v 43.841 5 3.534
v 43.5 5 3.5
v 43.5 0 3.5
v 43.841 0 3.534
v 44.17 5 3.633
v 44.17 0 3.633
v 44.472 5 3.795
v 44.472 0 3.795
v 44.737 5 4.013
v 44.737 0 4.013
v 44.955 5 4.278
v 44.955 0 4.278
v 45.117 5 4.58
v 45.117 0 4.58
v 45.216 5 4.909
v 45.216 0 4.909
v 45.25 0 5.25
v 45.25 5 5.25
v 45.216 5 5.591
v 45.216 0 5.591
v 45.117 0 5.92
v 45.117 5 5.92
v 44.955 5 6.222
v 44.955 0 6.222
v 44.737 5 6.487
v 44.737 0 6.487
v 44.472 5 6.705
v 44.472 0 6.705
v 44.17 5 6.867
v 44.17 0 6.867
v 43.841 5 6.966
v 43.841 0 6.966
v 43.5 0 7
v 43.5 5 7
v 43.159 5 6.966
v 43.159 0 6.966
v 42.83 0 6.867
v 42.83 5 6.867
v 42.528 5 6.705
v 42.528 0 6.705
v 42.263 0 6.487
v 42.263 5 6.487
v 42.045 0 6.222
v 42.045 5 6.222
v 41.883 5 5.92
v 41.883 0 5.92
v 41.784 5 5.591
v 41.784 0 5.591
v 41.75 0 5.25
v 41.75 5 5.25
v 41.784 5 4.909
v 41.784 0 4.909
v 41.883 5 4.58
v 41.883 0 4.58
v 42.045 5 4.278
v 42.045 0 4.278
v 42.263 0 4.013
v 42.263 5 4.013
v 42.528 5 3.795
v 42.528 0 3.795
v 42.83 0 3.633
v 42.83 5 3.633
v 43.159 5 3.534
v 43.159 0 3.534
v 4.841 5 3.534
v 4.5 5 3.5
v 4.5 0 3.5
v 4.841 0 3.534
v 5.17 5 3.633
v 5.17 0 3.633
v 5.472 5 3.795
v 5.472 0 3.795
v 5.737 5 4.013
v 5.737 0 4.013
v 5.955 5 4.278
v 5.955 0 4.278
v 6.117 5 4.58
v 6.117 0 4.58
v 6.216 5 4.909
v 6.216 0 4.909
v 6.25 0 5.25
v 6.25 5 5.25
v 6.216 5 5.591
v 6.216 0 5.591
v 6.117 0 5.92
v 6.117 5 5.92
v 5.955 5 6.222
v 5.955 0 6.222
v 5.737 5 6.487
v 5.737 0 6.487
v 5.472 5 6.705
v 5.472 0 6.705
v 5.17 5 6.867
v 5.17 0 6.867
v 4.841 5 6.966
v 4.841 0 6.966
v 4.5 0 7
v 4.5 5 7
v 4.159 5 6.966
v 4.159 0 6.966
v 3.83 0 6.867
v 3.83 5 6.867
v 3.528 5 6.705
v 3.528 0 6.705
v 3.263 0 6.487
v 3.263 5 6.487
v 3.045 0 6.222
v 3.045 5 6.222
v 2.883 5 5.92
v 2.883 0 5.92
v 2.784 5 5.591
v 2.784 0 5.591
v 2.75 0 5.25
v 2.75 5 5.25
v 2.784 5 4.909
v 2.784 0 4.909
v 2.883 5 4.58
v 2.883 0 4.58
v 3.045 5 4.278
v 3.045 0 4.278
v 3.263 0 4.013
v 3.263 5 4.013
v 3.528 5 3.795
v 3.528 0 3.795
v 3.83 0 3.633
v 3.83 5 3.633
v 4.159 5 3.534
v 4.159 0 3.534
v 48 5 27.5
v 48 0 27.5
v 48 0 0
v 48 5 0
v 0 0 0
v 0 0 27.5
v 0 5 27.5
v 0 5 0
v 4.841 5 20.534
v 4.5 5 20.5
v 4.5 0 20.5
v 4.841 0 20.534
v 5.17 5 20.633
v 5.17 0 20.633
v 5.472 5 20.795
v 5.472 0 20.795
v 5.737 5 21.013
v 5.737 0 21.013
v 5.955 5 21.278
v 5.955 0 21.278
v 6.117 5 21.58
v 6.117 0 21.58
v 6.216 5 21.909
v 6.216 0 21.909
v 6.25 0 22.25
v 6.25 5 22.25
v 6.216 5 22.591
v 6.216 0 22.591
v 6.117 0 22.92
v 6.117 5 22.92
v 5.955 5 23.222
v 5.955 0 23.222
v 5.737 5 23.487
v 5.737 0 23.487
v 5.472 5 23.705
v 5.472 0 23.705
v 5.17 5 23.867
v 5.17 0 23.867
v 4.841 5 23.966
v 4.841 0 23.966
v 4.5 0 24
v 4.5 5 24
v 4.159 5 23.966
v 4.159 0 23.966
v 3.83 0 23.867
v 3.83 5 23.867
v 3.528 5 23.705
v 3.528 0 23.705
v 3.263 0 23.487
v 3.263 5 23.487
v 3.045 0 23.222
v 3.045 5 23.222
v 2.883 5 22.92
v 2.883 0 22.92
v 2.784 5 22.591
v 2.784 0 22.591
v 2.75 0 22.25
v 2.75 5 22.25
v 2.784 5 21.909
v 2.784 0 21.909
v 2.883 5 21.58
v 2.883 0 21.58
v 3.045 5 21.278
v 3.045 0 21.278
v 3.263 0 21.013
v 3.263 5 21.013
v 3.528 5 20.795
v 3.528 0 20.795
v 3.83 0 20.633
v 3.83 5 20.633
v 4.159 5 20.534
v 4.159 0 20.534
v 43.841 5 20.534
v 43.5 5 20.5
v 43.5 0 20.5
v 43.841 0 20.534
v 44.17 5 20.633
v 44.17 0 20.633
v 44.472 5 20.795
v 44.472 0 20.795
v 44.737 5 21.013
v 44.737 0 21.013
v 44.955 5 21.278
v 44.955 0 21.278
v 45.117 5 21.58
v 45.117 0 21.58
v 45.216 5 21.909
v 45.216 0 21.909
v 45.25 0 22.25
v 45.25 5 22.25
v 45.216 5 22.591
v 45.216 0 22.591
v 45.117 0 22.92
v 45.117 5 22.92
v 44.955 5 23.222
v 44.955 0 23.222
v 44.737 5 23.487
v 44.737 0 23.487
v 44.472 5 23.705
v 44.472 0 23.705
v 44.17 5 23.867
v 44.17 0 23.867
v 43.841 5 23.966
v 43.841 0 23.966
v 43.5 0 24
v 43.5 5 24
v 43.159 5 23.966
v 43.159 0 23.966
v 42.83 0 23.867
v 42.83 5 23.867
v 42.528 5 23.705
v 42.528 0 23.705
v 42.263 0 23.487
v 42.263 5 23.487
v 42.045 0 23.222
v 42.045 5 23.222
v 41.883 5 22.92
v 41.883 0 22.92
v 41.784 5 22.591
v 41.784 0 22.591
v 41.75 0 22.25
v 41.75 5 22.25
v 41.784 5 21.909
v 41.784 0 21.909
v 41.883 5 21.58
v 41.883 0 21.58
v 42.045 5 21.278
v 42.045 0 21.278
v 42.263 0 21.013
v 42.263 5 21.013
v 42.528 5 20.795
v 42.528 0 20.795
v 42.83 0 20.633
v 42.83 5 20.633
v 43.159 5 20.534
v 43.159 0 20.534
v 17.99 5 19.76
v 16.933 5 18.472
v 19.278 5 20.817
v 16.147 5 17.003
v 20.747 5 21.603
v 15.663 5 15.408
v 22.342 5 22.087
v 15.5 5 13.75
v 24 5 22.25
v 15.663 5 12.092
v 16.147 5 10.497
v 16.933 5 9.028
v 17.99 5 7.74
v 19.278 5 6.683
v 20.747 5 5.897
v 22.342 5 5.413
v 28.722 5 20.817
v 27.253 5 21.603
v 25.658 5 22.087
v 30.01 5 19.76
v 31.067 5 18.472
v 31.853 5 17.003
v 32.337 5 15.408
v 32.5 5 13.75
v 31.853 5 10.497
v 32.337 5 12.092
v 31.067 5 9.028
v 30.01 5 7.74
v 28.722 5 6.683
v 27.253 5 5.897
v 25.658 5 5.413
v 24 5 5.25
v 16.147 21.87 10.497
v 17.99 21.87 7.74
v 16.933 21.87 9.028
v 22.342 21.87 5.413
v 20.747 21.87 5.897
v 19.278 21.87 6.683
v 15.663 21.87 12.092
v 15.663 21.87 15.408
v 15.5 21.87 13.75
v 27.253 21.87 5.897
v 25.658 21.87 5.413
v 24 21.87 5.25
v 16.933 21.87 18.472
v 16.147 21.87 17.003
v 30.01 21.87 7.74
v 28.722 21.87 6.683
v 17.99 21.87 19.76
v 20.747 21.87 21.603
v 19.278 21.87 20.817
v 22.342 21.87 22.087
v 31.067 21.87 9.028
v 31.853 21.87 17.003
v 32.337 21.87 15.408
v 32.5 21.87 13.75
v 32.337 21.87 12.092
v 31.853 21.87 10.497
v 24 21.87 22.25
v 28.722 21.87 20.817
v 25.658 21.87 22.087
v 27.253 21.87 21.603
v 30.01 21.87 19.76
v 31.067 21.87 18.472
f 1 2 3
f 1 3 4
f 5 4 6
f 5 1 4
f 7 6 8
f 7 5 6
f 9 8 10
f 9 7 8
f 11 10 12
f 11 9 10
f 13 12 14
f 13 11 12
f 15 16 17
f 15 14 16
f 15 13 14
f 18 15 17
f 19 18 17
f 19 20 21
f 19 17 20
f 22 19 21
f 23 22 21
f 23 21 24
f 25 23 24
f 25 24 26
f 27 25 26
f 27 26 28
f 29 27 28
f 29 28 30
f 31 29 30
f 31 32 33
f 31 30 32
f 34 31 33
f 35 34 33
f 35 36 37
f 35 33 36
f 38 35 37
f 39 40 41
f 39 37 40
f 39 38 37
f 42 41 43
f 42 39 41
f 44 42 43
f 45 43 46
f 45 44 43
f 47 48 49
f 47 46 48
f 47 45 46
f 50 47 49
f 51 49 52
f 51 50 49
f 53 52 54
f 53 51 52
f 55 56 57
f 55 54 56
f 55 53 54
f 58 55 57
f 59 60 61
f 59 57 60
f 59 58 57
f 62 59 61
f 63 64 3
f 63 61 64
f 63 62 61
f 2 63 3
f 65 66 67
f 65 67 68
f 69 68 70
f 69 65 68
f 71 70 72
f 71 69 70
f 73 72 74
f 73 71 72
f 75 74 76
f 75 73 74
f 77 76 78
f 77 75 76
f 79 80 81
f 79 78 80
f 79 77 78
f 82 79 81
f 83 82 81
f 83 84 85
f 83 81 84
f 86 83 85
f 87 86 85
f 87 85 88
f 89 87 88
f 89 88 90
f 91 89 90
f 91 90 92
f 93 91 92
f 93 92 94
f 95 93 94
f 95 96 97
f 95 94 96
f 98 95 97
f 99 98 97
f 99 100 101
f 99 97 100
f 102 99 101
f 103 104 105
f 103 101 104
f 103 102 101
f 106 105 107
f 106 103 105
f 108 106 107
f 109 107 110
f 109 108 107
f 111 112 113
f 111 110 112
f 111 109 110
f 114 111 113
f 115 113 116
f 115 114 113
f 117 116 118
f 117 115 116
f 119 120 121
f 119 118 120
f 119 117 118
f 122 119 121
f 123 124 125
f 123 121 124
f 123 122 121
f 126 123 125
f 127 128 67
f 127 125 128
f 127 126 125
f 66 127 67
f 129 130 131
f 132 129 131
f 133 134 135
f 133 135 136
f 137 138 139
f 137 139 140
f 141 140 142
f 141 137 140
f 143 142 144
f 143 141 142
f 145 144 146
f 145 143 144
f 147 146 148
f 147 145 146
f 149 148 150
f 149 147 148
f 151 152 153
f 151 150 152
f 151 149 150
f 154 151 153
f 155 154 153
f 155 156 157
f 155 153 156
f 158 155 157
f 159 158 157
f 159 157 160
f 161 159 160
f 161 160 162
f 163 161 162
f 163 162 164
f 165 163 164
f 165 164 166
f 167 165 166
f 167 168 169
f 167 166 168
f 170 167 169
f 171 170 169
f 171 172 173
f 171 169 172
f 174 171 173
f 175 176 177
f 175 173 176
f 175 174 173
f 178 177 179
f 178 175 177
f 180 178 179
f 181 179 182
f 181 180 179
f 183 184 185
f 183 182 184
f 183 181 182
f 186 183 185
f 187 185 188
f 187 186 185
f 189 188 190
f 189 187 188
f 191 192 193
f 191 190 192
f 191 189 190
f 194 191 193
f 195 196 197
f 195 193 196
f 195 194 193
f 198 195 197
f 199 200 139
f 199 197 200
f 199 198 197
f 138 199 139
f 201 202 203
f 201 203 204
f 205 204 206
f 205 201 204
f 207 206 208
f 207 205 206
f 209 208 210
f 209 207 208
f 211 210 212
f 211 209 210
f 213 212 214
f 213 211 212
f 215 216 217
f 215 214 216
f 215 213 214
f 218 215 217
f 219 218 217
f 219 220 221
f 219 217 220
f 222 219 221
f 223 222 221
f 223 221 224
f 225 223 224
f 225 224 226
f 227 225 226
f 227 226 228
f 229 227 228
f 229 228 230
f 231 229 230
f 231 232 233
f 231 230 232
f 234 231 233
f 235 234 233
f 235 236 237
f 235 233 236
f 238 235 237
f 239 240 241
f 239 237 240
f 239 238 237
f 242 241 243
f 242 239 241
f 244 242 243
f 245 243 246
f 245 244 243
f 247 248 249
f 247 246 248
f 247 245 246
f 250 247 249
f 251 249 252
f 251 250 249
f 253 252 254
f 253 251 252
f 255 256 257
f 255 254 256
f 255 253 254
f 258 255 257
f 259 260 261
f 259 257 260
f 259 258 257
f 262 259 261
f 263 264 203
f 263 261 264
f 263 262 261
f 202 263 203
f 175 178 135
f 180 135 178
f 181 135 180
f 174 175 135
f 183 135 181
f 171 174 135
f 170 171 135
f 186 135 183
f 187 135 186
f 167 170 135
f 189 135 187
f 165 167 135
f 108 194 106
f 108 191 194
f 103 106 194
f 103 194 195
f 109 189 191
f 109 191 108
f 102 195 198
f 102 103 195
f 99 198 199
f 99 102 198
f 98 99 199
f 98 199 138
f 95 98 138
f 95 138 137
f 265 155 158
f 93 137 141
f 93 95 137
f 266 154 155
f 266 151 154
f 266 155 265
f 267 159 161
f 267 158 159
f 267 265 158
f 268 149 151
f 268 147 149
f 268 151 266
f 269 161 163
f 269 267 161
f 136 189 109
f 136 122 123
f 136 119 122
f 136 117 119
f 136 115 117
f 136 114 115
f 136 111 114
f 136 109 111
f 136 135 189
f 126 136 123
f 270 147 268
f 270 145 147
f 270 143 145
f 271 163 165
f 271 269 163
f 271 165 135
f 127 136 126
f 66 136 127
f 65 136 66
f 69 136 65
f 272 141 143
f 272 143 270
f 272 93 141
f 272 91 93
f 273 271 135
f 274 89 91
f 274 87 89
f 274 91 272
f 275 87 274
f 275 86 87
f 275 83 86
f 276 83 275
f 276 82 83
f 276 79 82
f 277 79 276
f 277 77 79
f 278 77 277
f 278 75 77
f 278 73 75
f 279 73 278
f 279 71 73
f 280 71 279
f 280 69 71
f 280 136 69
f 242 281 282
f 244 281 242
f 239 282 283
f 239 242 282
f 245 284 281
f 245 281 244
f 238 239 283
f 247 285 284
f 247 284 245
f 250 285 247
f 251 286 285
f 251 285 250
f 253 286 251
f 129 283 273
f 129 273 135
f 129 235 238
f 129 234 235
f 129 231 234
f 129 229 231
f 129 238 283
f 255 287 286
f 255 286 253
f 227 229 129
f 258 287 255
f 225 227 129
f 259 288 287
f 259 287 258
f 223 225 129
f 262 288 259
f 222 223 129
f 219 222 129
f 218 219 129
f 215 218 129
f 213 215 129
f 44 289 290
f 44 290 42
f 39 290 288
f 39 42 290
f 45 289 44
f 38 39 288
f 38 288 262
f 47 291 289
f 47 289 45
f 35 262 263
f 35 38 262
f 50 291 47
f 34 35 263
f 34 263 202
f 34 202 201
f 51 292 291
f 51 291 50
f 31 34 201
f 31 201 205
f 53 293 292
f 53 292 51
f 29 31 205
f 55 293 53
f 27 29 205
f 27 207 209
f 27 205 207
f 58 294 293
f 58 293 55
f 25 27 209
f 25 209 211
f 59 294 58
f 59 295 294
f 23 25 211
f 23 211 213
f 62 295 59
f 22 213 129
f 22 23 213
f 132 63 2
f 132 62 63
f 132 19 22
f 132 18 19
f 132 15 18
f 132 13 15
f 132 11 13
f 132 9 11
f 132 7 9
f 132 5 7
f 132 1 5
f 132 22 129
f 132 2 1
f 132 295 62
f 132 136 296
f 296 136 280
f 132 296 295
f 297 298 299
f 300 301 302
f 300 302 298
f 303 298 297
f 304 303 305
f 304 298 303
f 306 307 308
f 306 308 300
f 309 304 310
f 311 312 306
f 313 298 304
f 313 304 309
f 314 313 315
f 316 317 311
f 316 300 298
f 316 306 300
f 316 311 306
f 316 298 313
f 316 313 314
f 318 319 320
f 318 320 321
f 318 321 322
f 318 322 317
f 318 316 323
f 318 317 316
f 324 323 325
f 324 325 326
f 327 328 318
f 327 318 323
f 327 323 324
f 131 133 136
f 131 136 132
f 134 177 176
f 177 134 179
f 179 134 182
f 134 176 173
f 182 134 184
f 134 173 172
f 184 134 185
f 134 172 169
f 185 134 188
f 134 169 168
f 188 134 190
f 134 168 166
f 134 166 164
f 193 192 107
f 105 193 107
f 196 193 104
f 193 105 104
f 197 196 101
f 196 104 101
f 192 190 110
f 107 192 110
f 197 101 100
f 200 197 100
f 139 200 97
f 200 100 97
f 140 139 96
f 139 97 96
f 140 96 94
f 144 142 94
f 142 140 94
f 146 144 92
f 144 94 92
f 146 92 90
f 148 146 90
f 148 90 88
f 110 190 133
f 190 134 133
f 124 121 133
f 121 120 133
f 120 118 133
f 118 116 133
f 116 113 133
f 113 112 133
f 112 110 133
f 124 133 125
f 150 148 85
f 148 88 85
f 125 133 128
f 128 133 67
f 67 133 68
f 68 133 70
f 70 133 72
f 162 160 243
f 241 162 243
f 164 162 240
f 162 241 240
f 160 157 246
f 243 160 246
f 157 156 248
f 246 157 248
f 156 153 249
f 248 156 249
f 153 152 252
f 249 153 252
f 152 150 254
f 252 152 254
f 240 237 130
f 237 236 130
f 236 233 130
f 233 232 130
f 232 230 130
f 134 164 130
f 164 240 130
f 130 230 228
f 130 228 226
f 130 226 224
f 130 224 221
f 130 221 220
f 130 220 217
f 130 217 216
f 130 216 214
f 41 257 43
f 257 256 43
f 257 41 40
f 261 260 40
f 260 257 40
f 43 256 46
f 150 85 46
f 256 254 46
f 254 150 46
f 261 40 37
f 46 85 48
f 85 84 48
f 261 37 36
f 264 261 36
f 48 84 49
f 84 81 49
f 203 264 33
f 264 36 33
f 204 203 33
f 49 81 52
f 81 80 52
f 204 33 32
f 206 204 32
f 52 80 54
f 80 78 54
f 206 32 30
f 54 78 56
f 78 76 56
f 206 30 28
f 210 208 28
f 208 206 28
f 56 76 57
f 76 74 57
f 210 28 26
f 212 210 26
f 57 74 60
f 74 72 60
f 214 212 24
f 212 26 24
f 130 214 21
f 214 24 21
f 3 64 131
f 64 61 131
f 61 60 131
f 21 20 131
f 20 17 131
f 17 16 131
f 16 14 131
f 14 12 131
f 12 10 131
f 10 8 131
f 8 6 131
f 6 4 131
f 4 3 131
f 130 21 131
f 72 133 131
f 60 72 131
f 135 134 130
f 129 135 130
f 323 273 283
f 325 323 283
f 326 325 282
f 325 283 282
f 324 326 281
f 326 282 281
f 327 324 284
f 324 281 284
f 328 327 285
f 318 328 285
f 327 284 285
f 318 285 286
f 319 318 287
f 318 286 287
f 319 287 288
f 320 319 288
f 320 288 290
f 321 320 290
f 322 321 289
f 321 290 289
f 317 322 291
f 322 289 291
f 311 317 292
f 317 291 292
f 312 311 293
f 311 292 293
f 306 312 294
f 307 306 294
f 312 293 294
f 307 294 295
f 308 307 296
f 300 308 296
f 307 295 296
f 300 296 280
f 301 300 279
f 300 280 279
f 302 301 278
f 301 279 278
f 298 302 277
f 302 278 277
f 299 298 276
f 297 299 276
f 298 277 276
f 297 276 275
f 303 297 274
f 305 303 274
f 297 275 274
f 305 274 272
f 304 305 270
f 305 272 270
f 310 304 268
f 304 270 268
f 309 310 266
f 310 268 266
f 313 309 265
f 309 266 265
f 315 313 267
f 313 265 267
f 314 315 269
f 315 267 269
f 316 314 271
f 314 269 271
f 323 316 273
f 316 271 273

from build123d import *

# Parameters (mm, degrees)
SKETCH_1_W               = 48
SKETCH_1_H               = 27.5
EXTRUDE_1_DEPTH          = 5
SKETCH_2_R               = 8.5
EXTRUDE_2_DEPTH          = 16.87
CUT_EXTRUDE_1_DEPTH      = 60.485686514
CUT_EXTRUDE_1_DEPTH_BACK = 60.485686514
SKETCH_3_R               = 1.75


with BuildPart() as part:
    # 草图1 → 凸台-拉伸1 (new body)
    with BuildSketch(Plane(origin=(0, 0, 0), x_dir=(1, 0, 0), z_dir=(0, 1, 0))):
        with Locations((24, -13.75)):
            Rectangle(SKETCH_1_W, SKETCH_1_H)
    extrude(amount=EXTRUDE_1_DEPTH)

    # 草图2 → 凸台-拉伸2 (add)
    with BuildSketch(Plane(origin=(0, 5, 0), x_dir=(1, 0, 0), z_dir=(0, 1, 0))):
        with Locations(Location((24, -13.75, 0), (0, 0, 270))):
            Circle(SKETCH_2_R)
    extrude(amount=EXTRUDE_2_DEPTH)

    # 草图3 → 切除-拉伸1 (cut, two sides: drawn at the far end of the back side and taken through both)
    with BuildSketch(Plane.XZ.offset(-CUT_EXTRUDE_1_DEPTH_BACK)):
        with Locations(Location((4.5, 22.25, 0), (0, 0, 270))):
            Circle(SKETCH_3_R)
        with Locations(Location((43.5, 22.25, 0), (0, 0, 270))):
            Circle(SKETCH_3_R)
        with Locations(Location((43.5, 5.25, 0), (0, 0, 270))):
            Circle(SKETCH_3_R)
        with Locations(Location((4.5, 5.25, 0), (0, 0, 270))):
            Circle(SKETCH_3_R)
    extrude(amount=CUT_EXTRUDE_1_DEPTH + CUT_EXTRUDE_1_DEPTH_BACK, mode=Mode.SUBTRACT)


solid = part.part
